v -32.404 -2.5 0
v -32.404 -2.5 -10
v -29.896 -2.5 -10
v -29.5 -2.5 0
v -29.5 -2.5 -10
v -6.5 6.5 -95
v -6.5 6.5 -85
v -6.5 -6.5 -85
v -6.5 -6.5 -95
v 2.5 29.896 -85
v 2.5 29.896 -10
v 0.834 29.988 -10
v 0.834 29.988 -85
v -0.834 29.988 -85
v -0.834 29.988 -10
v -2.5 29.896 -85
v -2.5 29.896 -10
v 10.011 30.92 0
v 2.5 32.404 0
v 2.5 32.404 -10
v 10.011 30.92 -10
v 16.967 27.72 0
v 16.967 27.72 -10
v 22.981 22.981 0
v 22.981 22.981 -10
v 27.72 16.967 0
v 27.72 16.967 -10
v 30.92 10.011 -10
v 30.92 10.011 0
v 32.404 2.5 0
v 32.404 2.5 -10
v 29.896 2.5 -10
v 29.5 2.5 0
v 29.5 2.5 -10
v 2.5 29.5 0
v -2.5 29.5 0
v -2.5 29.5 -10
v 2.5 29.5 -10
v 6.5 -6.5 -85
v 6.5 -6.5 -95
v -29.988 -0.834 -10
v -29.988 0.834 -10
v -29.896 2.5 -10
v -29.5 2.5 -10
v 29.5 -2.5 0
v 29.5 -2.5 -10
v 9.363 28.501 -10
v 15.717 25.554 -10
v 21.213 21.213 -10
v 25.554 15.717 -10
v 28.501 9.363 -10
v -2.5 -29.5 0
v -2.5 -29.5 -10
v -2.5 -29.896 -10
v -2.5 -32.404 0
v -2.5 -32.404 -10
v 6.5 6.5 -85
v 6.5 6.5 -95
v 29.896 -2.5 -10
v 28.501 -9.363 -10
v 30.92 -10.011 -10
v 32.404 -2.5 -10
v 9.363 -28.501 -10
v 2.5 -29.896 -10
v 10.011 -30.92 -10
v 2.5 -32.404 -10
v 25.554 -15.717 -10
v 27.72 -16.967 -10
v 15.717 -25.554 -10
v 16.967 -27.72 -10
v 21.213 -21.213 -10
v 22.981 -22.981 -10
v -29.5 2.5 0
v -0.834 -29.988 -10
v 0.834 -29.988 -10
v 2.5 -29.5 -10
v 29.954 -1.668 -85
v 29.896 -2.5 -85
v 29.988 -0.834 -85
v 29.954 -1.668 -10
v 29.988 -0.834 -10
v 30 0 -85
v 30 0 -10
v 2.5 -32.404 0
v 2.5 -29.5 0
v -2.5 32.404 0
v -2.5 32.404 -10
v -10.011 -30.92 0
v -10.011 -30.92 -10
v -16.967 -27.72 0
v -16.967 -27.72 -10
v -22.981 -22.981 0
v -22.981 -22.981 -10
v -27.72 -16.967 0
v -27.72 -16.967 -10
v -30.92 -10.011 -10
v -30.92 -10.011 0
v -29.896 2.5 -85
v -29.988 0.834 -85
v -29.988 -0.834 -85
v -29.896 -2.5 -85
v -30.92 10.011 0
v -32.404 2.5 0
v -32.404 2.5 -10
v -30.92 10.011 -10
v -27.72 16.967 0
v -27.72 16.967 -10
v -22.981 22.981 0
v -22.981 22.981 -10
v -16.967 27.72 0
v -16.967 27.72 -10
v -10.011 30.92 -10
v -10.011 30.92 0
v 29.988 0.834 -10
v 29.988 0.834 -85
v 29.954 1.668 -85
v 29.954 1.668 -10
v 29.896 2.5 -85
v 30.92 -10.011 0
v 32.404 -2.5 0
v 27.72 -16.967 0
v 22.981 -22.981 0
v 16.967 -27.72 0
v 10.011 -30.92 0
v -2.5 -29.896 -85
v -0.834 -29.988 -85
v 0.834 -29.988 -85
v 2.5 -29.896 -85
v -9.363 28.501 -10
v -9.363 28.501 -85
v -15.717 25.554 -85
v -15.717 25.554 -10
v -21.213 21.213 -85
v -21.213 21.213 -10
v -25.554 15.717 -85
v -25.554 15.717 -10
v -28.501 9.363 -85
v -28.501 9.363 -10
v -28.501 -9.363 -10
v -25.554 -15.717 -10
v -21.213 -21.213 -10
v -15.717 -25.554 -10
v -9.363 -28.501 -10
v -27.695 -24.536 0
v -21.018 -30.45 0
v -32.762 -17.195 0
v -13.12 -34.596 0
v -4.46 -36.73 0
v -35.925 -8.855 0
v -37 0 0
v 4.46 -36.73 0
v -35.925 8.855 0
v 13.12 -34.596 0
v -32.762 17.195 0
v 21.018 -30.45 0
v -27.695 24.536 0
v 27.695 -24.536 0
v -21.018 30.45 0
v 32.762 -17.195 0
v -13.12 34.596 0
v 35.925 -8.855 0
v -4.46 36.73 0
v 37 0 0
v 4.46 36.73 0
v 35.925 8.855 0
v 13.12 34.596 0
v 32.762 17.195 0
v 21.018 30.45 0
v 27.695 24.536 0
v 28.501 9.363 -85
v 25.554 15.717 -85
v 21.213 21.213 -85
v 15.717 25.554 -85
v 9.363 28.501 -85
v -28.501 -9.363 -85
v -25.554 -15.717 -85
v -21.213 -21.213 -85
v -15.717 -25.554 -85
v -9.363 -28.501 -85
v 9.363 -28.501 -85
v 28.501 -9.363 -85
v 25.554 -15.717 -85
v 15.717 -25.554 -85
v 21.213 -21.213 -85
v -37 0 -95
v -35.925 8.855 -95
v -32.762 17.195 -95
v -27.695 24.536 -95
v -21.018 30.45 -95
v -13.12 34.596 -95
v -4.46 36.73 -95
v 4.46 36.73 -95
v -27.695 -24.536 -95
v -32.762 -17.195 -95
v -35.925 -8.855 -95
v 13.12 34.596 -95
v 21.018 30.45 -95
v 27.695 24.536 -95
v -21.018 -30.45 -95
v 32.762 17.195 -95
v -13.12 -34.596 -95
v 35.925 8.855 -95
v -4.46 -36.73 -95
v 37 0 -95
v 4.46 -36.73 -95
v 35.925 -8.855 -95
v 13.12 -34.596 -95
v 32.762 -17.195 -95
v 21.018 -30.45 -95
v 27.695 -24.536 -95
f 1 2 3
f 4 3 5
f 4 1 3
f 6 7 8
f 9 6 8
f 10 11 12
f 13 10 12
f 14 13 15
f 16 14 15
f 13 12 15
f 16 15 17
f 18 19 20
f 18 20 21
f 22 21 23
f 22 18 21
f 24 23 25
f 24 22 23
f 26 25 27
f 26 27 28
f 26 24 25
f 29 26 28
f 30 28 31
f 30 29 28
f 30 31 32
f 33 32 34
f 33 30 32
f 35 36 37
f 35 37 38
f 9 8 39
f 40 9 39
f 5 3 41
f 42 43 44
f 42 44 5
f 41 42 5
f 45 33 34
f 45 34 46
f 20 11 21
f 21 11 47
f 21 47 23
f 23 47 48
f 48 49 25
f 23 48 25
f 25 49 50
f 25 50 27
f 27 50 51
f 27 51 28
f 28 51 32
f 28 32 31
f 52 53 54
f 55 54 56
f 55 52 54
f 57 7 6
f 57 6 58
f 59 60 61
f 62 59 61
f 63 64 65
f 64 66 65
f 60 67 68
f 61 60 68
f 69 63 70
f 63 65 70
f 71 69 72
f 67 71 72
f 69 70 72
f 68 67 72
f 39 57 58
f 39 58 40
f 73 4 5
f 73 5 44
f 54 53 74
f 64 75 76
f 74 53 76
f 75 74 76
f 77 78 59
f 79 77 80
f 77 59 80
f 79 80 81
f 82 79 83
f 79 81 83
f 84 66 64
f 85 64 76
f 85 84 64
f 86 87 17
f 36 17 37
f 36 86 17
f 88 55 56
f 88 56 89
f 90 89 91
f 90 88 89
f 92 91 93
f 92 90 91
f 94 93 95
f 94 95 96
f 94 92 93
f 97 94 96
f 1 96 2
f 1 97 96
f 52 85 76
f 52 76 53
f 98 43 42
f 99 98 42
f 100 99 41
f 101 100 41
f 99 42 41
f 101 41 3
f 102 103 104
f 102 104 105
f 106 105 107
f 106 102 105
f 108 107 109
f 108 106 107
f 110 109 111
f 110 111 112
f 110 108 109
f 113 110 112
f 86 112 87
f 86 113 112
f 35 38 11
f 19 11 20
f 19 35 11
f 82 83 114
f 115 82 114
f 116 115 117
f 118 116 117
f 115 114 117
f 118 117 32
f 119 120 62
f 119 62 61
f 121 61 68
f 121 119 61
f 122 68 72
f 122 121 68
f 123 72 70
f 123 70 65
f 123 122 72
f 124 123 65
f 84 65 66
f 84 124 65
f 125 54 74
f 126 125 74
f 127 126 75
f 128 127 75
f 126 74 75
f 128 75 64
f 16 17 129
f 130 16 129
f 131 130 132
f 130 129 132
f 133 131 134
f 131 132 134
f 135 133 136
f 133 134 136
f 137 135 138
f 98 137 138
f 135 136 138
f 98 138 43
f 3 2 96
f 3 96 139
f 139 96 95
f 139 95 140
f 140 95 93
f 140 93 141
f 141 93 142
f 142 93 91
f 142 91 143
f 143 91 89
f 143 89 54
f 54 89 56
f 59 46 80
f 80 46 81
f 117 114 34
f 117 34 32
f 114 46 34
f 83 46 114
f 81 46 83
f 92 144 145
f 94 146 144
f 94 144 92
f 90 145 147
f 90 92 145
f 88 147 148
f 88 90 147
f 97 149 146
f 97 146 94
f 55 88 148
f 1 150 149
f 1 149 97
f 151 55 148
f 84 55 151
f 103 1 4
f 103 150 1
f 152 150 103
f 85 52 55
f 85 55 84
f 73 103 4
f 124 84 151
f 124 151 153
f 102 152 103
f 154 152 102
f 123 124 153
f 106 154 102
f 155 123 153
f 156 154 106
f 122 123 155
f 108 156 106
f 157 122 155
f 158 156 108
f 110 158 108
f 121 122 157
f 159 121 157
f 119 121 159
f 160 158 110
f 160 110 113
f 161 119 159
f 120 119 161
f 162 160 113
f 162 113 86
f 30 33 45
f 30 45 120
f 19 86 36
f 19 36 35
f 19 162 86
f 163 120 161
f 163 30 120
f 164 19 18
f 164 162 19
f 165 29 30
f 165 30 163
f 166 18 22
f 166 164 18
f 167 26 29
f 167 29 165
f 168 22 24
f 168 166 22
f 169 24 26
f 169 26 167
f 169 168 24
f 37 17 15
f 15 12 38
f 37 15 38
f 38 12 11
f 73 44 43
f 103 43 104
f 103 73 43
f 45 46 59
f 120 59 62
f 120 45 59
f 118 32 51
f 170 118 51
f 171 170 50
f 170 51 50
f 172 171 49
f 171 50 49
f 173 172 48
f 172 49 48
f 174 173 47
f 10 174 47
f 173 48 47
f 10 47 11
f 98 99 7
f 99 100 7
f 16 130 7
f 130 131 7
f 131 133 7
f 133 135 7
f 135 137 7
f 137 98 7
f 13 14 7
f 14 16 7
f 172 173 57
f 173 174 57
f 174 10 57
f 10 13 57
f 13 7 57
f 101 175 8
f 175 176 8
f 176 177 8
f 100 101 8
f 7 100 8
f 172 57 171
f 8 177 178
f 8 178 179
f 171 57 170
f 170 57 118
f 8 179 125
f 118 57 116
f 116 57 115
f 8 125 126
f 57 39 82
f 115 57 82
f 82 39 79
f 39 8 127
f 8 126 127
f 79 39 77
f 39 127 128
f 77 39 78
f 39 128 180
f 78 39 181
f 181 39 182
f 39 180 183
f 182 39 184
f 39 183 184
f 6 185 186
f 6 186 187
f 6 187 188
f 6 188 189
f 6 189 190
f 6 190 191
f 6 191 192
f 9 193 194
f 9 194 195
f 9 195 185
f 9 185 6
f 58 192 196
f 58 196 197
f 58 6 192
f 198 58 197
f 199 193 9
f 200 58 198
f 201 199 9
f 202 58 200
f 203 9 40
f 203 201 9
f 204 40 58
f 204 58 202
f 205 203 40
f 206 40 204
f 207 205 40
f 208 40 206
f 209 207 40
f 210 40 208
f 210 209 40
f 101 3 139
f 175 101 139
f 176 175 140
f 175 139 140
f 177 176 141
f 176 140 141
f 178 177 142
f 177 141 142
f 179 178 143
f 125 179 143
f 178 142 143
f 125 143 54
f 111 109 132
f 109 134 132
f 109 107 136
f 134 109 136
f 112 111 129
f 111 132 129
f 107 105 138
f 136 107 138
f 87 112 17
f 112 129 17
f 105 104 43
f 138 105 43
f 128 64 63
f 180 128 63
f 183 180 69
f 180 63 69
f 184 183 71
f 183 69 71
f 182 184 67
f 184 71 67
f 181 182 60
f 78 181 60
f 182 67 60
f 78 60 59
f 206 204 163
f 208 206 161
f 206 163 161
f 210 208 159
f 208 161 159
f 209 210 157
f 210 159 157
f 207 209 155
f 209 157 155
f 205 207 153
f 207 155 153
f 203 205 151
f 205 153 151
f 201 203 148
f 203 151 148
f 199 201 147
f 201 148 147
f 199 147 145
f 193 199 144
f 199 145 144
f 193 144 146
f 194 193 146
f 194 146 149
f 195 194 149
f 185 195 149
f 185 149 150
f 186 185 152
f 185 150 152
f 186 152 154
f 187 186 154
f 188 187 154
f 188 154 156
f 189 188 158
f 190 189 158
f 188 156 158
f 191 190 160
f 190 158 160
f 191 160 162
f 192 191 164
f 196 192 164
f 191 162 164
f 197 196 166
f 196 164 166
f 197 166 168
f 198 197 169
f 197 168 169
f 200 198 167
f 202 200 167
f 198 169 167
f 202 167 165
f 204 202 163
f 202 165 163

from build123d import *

# Parameters (mm, degrees)
F0_R     = 37
F1_DEPTH = 10
F2_R     = 37
F3_DEPTH = 75
F4_R     = 37
F4_R_2   = 30
F4_W     = 13
F4_H     = 13
F5_DEPTH = 10


with BuildPart() as f1:
    # F0 (on Top) → F1 (new body)
    with BuildSketch(Plane.XY):
        Circle(F0_R)
        with BuildLine():
            ThreePointArc((32.403703492, 2.5), (32.47591695, 1.250926958), (32.5, 0))
            ThreePointArc((32.5, 0), (32.47591695, -1.250926958), (32.403703492, -2.5))
            ThreePointArc((32.403703492, -2.5), (22.9809703886, -22.9809703886), (2.5, -32.403703492))
            ThreePointArc((2.5, -32.403703492), (0, -32.5), (-2.5, -32.403703492))
            ThreePointArc((-2.5, -32.403703492), (-22.9809703886, -22.9809703886), (-32.403703492, -2.5))
            ThreePointArc((-32.403703492, -2.5), (-32.5, 0), (-32.403703492, 2.5))
            ThreePointArc((-32.403703492, 2.5), (-22.9809703886, 22.9809703886), (-2.5, 32.403703492))
            ThreePointArc((-2.5, 32.403703492), (0, 32.5), (2.5, 32.403703492))
            ThreePointArc((2.5, 32.403703492), (22.9809703886, 22.9809703886), (32.403703492, 2.5))
        make_face(mode=Mode.SUBTRACT)
        with BuildLine():
            Line((2.5, 29.5), (2.5, 32.403703492))
            ThreePointArc((2.5, 32.403703492), (0, 32.5), (-2.5, 32.403703492))
            Line((-2.5, 32.403703492), (-2.5, 29.5))
            Line((-2.5, 29.5), (2.5, 29.5))
        make_face()
        with BuildLine():
            ThreePointArc((32.403703492, -2.5), (32.47591695, -1.250926958), (32.5, 0))
            ThreePointArc((32.5, 0), (32.47591695, 1.250926958), (32.403703492, 2.5))
            Line((32.403703492, 2.5), (29.5, 2.5))
            Line((29.5, 2.5), (29.5, -2.5))
            Line((29.5, -2.5), (32.403703492, -2.5))
        make_face()
        with BuildLine():
            ThreePointArc((-2.5, -32.403703492), (0, -32.5), (2.5, -32.403703492))
            Line((2.5, -32.403703492), (2.5, -29.5))
            Line((2.5, -29.5), (-2.5, -29.5))
            Line((-2.5, -29.5), (-2.5, -32.403703492))
        make_face()
        with BuildLine():
            Line((-29.5, 2.5), (-32.403703492, 2.5))
            ThreePointArc((-32.403703492, 2.5), (-32.5, 0), (-32.403703492, -2.5))
            Line((-32.403703492, -2.5), (-29.5, -2.5))
            Line((-29.5, -2.5), (-29.5, 2.5))
        make_face()
    extrude(amount=-F1_DEPTH)

    # F2 (on face) → F3 (join)
    with BuildSketch(Plane(origin=(0, 0, -10), x_dir=(1, 0, 0), z_dir=(0, 0, -1))):
        Circle(F2_R)
        with BuildLine():
            ThreePointArc((29.8956518578, 2.5), (29.9739016123, 1.2510883797), (30, 0))
            ThreePointArc((30, 0), (29.9739016123, -1.2510883797), (29.8956518578, -2.5))
            Line((29.8956518578, -2.5), (32.403703492, -2.5))
            ThreePointArc((32.403703492, -2.5), (22.9809703886, -22.9809703886), (2.5, -32.403703492))
            Line((2.5, -32.403703492), (2.5, -29.8956518578))
            ThreePointArc((2.5, -29.8956518578), (0, -30), (-2.5, -29.8956518578))
            Line((-2.5, -29.8956518578), (-2.5, -32.403703492))
            ThreePointArc((-2.5, -32.403703492), (-22.9809703886, -22.9809703886), (-32.403703492, -2.5))
            Line((-32.403703492, -2.5), (-29.8956518578, -2.5))
            ThreePointArc((-29.8956518578, -2.5), (-30, 0), (-29.8956518578, 2.5))
            Line((-29.8956518578, 2.5), (-32.403703492, 2.5))
            ThreePointArc((-32.403703492, 2.5), (-22.9809703886, 22.9809703886), (-2.5, 32.403703492))
            Line((-2.5, 32.403703492), (-2.5, 29.8956518578))
            ThreePointArc((-2.5, 29.8956518578), (0, 30), (2.5, 29.8956518578))
            Line((2.5, 29.8956518578), (2.5, 32.403703492))
            ThreePointArc((2.5, 32.403703492), (22.9809703886, 22.9809703886), (32.403703492, 2.5))
            Line((32.403703492, 2.5), (29.8956518578, 2.5))
        make_face(mode=Mode.SUBTRACT)
        with BuildLine():
            Line((32.403703492, -2.5), (29.8956518578, -2.5))
            ThreePointArc((29.8956518578, -2.5), (21.2132034356, -21.2132034356), (2.5, -29.8956518578))
            Line((2.5, -29.8956518578), (2.5, -32.403703492))
            ThreePointArc((2.5, -32.403703492), (22.9809703886, -22.9809703886), (32.403703492, -2.5))
        make_face()
        with BuildLine():
            Line((-2.5, -32.403703492), (-2.5, -29.8956518578))
            ThreePointArc((-2.5, -29.8956518578), (-21.2132034356, -21.2132034356), (-29.8956518578, -2.5))
            Line((-29.8956518578, -2.5), (-32.403703492, -2.5))
            ThreePointArc((-32.403703492, -2.5), (-22.9809703886, -22.9809703886), (-2.5, -32.403703492))
        make_face()
        with BuildLine():
            ThreePointArc((-29.8956518578, 2.5), (-21.2132034356, 21.2132034356), (-2.5, 29.8956518578))
            Line((-2.5, 29.8956518578), (-2.5, 32.403703492))
            ThreePointArc((-2.5, 32.403703492), (-22.9809703886, 22.9809703886), (-32.403703492, 2.5))
            Line((-32.403703492, 2.5), (-29.8956518578, 2.5))
        make_face()
        with BuildLine():
            ThreePointArc((2.5, 29.8956518578), (21.2132034356, 21.2132034356), (29.8956518578, 2.5))
            Line((29.8956518578, 2.5), (32.403703492, 2.5))
            ThreePointArc((32.403703492, 2.5), (22.9809703886, 22.9809703886), (2.5, 32.403703492))
            Line((2.5, 32.403703492), (2.5, 29.8956518578))
        make_face()
    extrude(amount=F3_DEPTH)

    # F4 (on face) → F5 (join)
    with BuildSketch(Plane(origin=(0, 0, -85), x_dir=(1, 0, 0), z_dir=(0, 0, -1))):
        Circle(F4_R)
        Circle(F4_R_2, mode=Mode.SUBTRACT)
        Circle(F4_R_2)
        Rectangle(F4_W, F4_H, mode=Mode.SUBTRACT)
    extrude(amount=F5_DEPTH)


solid = f1.part
